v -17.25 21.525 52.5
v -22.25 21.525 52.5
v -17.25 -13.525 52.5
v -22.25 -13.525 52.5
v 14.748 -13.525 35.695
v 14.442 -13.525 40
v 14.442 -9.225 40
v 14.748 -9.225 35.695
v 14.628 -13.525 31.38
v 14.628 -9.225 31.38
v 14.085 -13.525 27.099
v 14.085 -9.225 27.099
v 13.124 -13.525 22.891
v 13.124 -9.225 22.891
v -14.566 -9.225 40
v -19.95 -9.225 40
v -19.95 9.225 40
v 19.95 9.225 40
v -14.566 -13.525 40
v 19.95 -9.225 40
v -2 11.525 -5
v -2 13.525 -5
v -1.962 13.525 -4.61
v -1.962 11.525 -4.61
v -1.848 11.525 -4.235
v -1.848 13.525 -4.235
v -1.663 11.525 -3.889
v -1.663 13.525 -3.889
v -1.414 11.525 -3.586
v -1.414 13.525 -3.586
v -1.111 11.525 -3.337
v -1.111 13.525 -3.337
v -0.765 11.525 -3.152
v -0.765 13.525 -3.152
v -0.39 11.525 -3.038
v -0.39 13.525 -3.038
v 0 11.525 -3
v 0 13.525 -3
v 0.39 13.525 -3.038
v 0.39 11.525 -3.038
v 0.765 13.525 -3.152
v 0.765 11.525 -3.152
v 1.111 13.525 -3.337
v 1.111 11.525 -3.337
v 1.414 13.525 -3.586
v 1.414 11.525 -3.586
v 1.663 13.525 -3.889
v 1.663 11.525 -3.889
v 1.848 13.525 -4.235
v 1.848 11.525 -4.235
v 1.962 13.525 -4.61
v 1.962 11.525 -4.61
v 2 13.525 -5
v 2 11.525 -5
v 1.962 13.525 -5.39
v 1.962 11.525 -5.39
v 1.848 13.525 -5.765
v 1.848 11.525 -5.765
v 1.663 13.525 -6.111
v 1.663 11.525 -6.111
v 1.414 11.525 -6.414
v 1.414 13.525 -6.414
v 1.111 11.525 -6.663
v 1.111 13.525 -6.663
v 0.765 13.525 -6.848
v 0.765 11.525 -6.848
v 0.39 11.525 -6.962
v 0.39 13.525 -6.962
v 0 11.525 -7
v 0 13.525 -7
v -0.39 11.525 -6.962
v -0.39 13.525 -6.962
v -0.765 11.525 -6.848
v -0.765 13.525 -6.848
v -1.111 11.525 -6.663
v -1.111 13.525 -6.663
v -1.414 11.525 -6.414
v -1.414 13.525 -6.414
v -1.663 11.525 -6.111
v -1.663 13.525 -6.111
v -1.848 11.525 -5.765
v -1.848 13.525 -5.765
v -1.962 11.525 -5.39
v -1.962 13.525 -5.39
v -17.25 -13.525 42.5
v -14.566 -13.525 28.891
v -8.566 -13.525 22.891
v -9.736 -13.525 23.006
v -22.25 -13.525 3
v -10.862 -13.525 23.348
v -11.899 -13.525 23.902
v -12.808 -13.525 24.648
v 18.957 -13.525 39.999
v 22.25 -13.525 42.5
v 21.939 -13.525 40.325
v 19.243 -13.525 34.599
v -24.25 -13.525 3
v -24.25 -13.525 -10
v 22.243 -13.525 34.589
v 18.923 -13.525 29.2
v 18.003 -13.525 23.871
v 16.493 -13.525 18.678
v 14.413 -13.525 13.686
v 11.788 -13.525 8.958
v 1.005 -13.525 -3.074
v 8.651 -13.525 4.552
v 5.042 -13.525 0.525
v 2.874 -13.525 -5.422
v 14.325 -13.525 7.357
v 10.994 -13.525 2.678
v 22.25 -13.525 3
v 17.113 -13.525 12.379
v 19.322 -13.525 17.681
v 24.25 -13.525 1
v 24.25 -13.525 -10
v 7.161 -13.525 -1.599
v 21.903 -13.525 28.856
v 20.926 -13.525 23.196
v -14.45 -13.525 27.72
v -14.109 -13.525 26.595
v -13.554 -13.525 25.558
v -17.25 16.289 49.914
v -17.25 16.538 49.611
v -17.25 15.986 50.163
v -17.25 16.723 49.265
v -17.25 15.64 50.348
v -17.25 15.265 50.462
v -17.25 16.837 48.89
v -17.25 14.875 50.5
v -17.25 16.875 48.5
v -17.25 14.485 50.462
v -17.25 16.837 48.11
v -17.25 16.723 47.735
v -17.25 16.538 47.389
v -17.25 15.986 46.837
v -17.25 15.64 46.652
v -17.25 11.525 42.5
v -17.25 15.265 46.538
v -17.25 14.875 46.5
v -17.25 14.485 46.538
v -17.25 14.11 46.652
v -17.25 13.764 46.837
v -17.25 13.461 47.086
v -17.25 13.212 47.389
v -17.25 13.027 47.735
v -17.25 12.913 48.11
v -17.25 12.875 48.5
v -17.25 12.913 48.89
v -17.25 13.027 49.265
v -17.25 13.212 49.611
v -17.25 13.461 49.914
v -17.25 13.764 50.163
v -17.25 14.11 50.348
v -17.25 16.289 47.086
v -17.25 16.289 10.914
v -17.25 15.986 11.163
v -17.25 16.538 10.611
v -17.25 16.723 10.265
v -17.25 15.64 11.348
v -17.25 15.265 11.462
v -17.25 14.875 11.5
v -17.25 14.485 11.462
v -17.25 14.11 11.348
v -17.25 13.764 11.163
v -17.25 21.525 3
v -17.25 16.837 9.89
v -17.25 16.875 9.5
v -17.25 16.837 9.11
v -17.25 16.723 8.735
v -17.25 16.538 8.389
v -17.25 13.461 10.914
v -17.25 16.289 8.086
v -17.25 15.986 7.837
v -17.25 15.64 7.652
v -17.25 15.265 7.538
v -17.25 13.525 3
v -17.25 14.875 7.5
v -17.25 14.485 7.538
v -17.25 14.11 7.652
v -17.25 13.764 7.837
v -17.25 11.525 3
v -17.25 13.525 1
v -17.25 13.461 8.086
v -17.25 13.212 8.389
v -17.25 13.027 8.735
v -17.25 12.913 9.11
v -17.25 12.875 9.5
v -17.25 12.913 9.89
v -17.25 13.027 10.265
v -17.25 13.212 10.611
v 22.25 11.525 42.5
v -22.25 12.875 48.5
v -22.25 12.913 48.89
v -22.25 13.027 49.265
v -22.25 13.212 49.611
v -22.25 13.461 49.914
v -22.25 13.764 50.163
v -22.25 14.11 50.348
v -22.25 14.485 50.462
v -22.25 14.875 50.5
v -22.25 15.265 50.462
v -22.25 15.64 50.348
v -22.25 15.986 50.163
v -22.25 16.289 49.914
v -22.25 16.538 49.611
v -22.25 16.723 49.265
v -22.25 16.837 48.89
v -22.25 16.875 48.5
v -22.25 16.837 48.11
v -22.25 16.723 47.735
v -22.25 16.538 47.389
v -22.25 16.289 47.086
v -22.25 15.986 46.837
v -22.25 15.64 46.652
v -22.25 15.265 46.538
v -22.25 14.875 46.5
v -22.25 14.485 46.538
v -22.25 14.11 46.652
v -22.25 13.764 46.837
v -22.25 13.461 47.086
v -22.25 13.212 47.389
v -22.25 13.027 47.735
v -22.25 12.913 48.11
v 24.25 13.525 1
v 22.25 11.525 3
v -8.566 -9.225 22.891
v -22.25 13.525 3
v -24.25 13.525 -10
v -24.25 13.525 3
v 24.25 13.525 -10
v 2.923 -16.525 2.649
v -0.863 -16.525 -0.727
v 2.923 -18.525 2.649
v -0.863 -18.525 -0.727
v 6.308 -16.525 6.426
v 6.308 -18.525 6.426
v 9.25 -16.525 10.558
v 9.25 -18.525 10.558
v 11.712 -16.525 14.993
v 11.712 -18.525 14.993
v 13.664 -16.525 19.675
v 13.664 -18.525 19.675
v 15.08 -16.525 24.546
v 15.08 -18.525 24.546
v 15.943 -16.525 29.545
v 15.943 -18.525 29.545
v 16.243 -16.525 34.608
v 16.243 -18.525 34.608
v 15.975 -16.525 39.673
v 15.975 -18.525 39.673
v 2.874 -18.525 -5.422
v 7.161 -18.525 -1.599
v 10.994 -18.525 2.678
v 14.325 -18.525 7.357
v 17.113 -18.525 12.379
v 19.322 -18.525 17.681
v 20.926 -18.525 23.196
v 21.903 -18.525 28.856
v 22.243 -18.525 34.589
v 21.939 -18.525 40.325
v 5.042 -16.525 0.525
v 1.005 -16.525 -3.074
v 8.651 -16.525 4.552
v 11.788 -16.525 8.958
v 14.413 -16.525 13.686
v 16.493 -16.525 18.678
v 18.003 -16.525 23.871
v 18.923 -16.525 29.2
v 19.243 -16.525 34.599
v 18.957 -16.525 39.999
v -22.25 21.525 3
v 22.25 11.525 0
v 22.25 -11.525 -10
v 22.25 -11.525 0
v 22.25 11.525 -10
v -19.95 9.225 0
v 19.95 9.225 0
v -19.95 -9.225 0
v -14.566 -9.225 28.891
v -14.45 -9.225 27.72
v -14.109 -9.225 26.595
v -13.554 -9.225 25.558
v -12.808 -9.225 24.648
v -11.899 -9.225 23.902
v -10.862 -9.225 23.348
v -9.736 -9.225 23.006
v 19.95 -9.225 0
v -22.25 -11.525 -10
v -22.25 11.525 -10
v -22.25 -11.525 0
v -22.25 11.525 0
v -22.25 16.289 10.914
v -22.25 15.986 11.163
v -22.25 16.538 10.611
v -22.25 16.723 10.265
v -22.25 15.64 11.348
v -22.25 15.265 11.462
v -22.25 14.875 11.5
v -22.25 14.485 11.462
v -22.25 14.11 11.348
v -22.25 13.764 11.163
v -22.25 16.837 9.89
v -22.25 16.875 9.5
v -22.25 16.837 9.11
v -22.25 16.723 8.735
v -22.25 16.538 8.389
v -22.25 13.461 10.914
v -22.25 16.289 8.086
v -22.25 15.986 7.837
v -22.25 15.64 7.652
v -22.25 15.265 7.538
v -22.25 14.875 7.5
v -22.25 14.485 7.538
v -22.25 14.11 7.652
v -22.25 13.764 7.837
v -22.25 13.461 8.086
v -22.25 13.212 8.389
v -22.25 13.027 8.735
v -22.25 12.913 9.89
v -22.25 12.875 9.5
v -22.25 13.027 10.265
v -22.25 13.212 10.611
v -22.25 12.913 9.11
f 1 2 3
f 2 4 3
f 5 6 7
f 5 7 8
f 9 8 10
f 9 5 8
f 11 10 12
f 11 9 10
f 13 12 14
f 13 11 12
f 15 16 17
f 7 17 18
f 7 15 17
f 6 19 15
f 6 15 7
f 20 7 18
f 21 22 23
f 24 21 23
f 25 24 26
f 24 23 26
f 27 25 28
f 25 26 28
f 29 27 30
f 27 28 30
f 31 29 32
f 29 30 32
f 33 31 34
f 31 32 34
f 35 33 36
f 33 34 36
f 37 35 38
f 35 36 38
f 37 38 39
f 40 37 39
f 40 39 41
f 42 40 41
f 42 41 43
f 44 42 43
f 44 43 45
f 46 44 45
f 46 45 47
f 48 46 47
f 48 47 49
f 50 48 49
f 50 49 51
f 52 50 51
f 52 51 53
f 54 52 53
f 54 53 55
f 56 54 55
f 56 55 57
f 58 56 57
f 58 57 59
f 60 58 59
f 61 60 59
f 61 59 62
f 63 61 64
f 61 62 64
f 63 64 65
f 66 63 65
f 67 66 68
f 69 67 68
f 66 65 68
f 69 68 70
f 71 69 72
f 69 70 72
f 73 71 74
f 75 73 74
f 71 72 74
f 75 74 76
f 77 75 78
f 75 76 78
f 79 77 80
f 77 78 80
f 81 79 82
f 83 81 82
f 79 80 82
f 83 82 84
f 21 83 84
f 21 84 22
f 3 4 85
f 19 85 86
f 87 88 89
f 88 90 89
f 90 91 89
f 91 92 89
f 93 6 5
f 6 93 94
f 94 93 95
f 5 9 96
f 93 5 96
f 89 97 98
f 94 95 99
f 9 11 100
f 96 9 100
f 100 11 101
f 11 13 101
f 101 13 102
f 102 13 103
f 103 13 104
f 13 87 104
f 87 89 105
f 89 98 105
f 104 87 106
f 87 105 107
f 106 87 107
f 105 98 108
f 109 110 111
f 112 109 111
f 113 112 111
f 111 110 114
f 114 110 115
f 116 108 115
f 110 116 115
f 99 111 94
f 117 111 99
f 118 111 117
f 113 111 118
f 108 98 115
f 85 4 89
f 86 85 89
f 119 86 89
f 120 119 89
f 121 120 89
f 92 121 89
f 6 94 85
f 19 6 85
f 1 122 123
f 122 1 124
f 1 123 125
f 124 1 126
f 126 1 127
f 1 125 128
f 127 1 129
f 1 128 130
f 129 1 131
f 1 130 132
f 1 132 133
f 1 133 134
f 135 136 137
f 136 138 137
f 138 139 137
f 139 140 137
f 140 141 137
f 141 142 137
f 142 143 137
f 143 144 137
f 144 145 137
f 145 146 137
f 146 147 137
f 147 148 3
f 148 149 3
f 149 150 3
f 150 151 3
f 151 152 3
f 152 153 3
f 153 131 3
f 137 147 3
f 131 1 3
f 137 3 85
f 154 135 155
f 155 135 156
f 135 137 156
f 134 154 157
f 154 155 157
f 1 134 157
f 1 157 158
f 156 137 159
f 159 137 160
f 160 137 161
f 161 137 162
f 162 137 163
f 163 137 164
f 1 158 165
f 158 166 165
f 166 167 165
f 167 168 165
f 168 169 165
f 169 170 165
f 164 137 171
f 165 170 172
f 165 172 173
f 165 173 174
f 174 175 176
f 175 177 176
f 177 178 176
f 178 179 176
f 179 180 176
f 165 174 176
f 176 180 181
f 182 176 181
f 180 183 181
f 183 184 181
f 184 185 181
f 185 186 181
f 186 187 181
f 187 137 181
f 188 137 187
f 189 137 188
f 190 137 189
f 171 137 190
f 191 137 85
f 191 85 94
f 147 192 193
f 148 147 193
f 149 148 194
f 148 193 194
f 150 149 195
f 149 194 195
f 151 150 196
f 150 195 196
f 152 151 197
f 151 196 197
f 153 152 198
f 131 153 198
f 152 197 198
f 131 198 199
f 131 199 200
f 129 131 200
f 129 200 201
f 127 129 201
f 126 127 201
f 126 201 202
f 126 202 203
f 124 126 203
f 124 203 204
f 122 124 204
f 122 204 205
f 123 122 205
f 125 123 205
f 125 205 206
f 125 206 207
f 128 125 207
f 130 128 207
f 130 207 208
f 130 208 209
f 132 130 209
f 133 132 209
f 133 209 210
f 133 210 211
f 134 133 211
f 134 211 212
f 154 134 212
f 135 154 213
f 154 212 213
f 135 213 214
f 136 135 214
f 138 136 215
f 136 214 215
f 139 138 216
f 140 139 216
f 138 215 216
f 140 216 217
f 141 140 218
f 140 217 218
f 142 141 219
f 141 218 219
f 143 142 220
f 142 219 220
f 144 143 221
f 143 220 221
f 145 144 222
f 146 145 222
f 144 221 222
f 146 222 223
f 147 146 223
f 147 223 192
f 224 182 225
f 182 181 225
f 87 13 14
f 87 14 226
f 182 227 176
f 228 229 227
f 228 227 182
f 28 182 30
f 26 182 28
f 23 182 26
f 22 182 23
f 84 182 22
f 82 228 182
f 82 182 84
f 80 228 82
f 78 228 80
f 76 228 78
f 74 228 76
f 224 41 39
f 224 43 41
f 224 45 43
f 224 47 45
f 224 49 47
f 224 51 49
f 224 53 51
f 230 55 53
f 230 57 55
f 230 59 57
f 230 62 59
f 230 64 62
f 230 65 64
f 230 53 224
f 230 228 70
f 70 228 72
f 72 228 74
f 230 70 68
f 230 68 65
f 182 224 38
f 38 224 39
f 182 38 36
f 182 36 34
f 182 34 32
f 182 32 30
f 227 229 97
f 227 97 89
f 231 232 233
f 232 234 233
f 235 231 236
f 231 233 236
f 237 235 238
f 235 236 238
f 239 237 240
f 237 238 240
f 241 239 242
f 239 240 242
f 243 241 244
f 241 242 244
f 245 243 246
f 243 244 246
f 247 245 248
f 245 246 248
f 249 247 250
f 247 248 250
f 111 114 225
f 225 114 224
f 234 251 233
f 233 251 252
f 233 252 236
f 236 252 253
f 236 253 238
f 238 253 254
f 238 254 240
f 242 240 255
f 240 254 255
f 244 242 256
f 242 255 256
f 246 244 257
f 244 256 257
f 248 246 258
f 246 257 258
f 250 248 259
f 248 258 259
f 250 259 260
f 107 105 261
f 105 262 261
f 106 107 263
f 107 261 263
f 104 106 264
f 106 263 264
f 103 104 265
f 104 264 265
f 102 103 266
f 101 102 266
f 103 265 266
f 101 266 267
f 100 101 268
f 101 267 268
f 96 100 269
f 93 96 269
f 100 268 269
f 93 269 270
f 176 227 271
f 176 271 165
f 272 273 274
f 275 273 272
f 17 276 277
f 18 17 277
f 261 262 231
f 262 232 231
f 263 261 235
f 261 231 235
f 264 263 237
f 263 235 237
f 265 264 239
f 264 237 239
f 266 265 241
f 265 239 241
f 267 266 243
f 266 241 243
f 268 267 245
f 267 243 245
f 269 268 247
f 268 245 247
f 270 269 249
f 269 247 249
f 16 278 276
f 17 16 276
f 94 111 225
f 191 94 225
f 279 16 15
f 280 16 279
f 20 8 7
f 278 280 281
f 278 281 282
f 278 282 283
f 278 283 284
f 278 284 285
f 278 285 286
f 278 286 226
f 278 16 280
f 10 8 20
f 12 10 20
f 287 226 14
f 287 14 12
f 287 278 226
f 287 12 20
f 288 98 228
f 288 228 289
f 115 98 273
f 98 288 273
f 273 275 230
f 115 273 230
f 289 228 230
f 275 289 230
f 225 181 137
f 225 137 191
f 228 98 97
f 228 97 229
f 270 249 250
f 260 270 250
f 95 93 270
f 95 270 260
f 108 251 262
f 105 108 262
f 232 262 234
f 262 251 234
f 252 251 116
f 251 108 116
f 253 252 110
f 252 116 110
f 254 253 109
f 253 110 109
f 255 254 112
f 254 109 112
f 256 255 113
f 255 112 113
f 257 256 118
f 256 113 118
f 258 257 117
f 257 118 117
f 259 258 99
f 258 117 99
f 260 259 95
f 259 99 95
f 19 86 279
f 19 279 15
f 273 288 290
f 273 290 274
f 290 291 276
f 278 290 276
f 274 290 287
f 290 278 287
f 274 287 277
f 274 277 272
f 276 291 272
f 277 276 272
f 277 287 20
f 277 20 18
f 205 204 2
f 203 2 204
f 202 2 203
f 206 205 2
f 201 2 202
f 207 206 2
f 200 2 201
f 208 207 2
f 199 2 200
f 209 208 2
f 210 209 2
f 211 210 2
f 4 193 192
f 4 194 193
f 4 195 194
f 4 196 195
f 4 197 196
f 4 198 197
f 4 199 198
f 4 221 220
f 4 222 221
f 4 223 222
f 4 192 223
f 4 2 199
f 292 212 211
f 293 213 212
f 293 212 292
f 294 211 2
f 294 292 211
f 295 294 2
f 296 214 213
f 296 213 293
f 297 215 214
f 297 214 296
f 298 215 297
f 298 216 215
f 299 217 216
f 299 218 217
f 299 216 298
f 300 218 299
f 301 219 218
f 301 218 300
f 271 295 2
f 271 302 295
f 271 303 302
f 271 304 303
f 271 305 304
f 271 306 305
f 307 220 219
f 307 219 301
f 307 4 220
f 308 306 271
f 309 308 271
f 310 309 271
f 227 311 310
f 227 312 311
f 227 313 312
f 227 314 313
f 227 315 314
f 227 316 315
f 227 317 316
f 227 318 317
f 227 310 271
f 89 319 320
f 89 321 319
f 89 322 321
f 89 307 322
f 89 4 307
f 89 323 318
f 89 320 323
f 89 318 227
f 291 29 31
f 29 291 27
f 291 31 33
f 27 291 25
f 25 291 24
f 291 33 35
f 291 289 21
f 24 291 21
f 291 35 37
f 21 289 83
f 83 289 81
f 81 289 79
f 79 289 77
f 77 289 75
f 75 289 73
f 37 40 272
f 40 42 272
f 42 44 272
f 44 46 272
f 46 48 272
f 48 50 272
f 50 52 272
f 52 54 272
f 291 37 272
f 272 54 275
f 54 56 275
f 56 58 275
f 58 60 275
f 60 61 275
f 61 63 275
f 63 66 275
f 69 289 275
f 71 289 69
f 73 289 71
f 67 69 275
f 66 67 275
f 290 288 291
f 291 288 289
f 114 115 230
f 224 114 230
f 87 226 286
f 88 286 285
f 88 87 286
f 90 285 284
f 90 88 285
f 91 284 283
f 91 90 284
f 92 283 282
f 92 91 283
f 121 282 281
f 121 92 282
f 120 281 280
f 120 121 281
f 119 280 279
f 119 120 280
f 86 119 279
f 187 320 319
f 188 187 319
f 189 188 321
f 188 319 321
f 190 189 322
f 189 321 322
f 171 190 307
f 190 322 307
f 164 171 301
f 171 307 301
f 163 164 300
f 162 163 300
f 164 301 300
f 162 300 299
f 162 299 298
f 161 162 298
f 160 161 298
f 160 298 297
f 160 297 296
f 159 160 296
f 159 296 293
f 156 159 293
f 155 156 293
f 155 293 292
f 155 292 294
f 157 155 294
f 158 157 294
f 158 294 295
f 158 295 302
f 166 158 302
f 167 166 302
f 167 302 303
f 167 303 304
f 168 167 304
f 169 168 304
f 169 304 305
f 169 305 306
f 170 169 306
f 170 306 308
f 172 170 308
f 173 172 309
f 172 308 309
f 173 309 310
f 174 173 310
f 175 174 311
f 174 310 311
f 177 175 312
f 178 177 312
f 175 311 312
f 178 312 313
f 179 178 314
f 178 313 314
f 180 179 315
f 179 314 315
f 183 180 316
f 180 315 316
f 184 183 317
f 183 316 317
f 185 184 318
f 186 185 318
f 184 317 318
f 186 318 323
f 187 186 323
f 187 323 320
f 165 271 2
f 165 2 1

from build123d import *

# Parameters (mm, degrees)
SKETCH1_W                = 44.5
SKETCH1_H                = 25.05
SKETCH1_W_2              = 39.9
SKETCH1_H_2              = 18.45
BOSS_EXTRUDE1_DEPTH      = 40
BOSS_EXTRUDE2_START      = 40
BOSS_EXTRUDE2_OUTLINE_W  = 44.5
BOSS_EXTRUDE2_OUTLINE_H  = 25.05
BOSS_EXTRUDE2_DEPTH      = 2.5
BOSS_EXTRUDE3_DEPTH      = 3
BOSS_EXTRUDE3_DEPTH_BACK = 10
SKETCH1_4_W              = 48.5
SKETCH1_4_H              = 27.05
SKETCH1_4_W_2            = 44.5
SKETCH1_4_H_2            = 23.05
SKETCH2_W                = 5
SKETCH2_H                = 25.05
BOSS_EXTRUDE4_DEPTH      = 10
CUT_EXTRUDE1_REACH       = 65.844
SKETCH7_W                = 5
SKETCH7_H                = 49.5
BOSS_EXTRUDE5_DEPTH      = 10
SKETCH8_R                = 2
CUT_EXTRUDE2_DEPTH       = 5.8
CHAMFER1_SIZE            = 2
CHAMFER2_SIZE            = 2
SKETCH9_R                = 2
CUT_EXTRUDE3_DEPTH       = 10


# Read off the part's stored shape, not the designer's step: Boss-Extrude2
with BuildPart() as part:
    # Sketch1 → Boss-Extrude1 (new body)
    with BuildSketch(Plane.XY):
        with Locations((0, -1)):
            Rectangle(SKETCH1_W, SKETCH1_H)
        Rectangle(SKETCH1_W_2, SKETCH1_H_2, mode=Mode.SUBTRACT)
    extrude(amount=BOSS_EXTRUDE1_DEPTH)

    # Boss-Extrude2 outline → Boss-Extrude2 (add)
    with BuildSketch(Plane.XY.offset(BOSS_EXTRUDE2_START)):
        with Locations((0, -1)):
            Rectangle(BOSS_EXTRUDE2_OUTLINE_W, BOSS_EXTRUDE2_OUTLINE_H)
    extrude(amount=BOSS_EXTRUDE2_DEPTH)

    # Sketch1<4> → Boss-Extrude3 (add, two sides: drawn at the far end of the back side and taken through both)
    with BuildSketch(Plane.XY.offset(-BOSS_EXTRUDE3_DEPTH_BACK)):
        Rectangle(SKETCH1_4_W, SKETCH1_4_H)
        Rectangle(SKETCH1_4_W_2, SKETCH1_4_H_2, mode=Mode.SUBTRACT)
    extrude(amount=BOSS_EXTRUDE3_DEPTH + BOSS_EXTRUDE3_DEPTH_BACK)

    # Sketch2 → Boss-Extrude4 (add)
    with BuildSketch(Plane.XY.offset(42.5)):
        with Locations((-19.75, -1)):
            Rectangle(SKETCH2_W, SKETCH2_H)
    extrude(amount=BOSS_EXTRUDE4_DEPTH)

    # Sweep1: sweep along a path in Sketch4
    with BuildLine(Plane.XZ.offset(13.525)) as sweep1_path:
        ThreePointArc((1.009931304, -3.080074503), (15.529238499, 16.150172823), (18.964123835, 40))
    # Sketch6 → Sweep1 (sweep)
    with BuildSketch(Plane(origin=(18.964123835, -13.525, 40), x_dir=(0.9940873595600267, 0, 0.10858324715615325), z_dir=(-0.10858324715615325, 0, 0.9940873595600267))):
        Polygon((-0.007155114, -3), (-3.007155114, -3), (-3.007155114, -5), (2.992844886, -5), (2.992844886, -1.848135777), (2.992844886, 0), (-0.007155114, 0), align=None)
    sweep(path=sweep1_path.line)

    # Sketch4<3> → Cut-Extrude1 (cut, up to next)
    with BuildSketch(Plane.XZ.offset(13.525), mode=Mode.PRIVATE) as cut_extrude1_sk1:
        with BuildLine():
            Line((-14.565566912, 40), (14.442409674, 40))
            ThreePointArc((14.442409674, 40), (14.628132166, 31.380371303), (13.124010953, 22.890959598))
            Line((13.124010953, 22.890959598), (-8.565566912, 22.890959598))
            ThreePointArc((-8.565566912, 22.890959598), (-12.808207599, 24.648318911), (-14.565566912, 28.890959598))
            Line((-14.565566912, 28.890959598), (-14.565566912, 40))
        make_face()
    cut_extrude1_tool1 = extrude(cut_extrude1_sk1.sketch, amount=-CUT_EXTRUDE1_REACH, mode=Mode.PRIVATE) & part.part
    add(cut_extrude1_tool1.solids().sort_by_distance((0.104414, -13.525, 31.62544))[0], mode=Mode.SUBTRACT)

    # Sketch7 → Boss-Extrude5 (add)
    with BuildSketch(Plane(origin=(0, 11.525, 0), x_dir=(1, 0, 0), z_dir=(0, 1, 0))):
        with Locations((-19.75, -27.75)):
            Rectangle(SKETCH7_W, SKETCH7_H)
    extrude(amount=BOSS_EXTRUDE5_DEPTH)

    # Sketch8 → Cut-Extrude2 (cut)
    with BuildSketch(Plane.ZY.offset(22.25)):
        with Locations(Location((48.5, 14.875, 0), (0, 0, 270))):
            Circle(SKETCH8_R)
        with Locations(Location((9.5, 14.875, 0), (0, 0, 270))):
            Circle(SKETCH8_R)
    extrude(amount=-CUT_EXTRUDE2_DEPTH, mode=Mode.SUBTRACT)

    # Chamfer1
    chamfer1_edges = [part.edges().sort_by_distance(p)[0] for p in [
        (3.5, 13.525, 3),
    ]]
    chamfer(chamfer1_edges, length=CHAMFER1_SIZE - 0.0001)  # a hair under: the kernel refuses the full size

    # Chamfer2
    chamfer2_edges = [part.edges().sort_by_distance(p)[0] for p in [
        (24.25, -0.99995, 3),
    ]]
    chamfer(chamfer2_edges, length=CHAMFER2_SIZE)

    # Sketch9 → Cut-Extrude3 (cut)
    with BuildSketch(Plane(origin=(0, 13.525, 0), x_dir=(1, 0, 0), z_dir=(0, 1, 0))):
        with Locations(Location((0, 5, 0), (0, 0, 180))):
            Circle(SKETCH9_R)
    extrude(amount=-CUT_EXTRUDE3_DEPTH, mode=Mode.SUBTRACT)


solid = part.part
